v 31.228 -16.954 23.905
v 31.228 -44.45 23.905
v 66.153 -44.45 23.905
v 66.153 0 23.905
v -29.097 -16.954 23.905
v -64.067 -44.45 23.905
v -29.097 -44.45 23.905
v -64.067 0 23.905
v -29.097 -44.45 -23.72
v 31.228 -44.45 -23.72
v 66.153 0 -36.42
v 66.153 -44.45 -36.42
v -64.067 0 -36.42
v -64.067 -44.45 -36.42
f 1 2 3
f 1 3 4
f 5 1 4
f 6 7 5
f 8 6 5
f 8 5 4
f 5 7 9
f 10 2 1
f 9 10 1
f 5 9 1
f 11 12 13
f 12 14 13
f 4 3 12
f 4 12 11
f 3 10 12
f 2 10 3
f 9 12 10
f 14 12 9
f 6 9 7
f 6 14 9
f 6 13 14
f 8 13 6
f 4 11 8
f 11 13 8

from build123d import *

# Parameters (mm, degrees)
F0_W     = 130.175
F0_H     = 60.325
F1_DEPTH = 44.45
F3_W     = 34.9023286253
F3_H     = 60.4157168418
F4_DEPTH = 44.45
F5_DEPTH = 25.4
F7_DEPTH = 60.325
F8_W     = 44.45
F8_H     = 60.325
F9_DEPTH = 34.925


with BuildPart() as f1:
    # F0 (on Front) → F1 (new body)
    with BuildSketch(Plane.XZ):
        with Locations((1.020533964, -6.2578915411)):
            Rectangle(F0_W, F0_H)
    extrude(amount=F1_DEPTH)

    # F3 (on face) → F4 (cut)
    with BuildSketch(Plane.XZ.offset(44.45)):
        with Locations((48.6795557663, -6.1232140288)):
            Rectangle(F3_W, F3_H)
    extrude(amount=-F4_DEPTH, mode=Mode.SUBTRACT)

    # F5 (cut): a face of the model
    f5_faces = [f1.faces().sort_by_distance(p)[0] for p in [
        (48.6682127088, -22.225, -36.3310724497),
    ]]
    extrude(f5_faces, amount=-F5_DEPTH, mode=Mode.SUBTRACT)

    # F6 (on face) → F7 (cut)
    with BuildSketch(Plane.YZ.offset(31.2283914536)):
        Polygon((-44.45, 23.9046084589), (-44.45, -23.7203915411), (-16.9536934298, 23.9046084589), align=None)
    extrude(amount=-F7_DEPTH, mode=Mode.SUBTRACT)

    # F8 (on face) → F9 (join)
    with BuildSketch(Plane.YZ.offset(31.2283914536)):
        with Locations((-22.225, -6.2578915411)):
            Rectangle(F8_W, F8_H)
    extrude(amount=F9_DEPTH)


solid = f1.part
